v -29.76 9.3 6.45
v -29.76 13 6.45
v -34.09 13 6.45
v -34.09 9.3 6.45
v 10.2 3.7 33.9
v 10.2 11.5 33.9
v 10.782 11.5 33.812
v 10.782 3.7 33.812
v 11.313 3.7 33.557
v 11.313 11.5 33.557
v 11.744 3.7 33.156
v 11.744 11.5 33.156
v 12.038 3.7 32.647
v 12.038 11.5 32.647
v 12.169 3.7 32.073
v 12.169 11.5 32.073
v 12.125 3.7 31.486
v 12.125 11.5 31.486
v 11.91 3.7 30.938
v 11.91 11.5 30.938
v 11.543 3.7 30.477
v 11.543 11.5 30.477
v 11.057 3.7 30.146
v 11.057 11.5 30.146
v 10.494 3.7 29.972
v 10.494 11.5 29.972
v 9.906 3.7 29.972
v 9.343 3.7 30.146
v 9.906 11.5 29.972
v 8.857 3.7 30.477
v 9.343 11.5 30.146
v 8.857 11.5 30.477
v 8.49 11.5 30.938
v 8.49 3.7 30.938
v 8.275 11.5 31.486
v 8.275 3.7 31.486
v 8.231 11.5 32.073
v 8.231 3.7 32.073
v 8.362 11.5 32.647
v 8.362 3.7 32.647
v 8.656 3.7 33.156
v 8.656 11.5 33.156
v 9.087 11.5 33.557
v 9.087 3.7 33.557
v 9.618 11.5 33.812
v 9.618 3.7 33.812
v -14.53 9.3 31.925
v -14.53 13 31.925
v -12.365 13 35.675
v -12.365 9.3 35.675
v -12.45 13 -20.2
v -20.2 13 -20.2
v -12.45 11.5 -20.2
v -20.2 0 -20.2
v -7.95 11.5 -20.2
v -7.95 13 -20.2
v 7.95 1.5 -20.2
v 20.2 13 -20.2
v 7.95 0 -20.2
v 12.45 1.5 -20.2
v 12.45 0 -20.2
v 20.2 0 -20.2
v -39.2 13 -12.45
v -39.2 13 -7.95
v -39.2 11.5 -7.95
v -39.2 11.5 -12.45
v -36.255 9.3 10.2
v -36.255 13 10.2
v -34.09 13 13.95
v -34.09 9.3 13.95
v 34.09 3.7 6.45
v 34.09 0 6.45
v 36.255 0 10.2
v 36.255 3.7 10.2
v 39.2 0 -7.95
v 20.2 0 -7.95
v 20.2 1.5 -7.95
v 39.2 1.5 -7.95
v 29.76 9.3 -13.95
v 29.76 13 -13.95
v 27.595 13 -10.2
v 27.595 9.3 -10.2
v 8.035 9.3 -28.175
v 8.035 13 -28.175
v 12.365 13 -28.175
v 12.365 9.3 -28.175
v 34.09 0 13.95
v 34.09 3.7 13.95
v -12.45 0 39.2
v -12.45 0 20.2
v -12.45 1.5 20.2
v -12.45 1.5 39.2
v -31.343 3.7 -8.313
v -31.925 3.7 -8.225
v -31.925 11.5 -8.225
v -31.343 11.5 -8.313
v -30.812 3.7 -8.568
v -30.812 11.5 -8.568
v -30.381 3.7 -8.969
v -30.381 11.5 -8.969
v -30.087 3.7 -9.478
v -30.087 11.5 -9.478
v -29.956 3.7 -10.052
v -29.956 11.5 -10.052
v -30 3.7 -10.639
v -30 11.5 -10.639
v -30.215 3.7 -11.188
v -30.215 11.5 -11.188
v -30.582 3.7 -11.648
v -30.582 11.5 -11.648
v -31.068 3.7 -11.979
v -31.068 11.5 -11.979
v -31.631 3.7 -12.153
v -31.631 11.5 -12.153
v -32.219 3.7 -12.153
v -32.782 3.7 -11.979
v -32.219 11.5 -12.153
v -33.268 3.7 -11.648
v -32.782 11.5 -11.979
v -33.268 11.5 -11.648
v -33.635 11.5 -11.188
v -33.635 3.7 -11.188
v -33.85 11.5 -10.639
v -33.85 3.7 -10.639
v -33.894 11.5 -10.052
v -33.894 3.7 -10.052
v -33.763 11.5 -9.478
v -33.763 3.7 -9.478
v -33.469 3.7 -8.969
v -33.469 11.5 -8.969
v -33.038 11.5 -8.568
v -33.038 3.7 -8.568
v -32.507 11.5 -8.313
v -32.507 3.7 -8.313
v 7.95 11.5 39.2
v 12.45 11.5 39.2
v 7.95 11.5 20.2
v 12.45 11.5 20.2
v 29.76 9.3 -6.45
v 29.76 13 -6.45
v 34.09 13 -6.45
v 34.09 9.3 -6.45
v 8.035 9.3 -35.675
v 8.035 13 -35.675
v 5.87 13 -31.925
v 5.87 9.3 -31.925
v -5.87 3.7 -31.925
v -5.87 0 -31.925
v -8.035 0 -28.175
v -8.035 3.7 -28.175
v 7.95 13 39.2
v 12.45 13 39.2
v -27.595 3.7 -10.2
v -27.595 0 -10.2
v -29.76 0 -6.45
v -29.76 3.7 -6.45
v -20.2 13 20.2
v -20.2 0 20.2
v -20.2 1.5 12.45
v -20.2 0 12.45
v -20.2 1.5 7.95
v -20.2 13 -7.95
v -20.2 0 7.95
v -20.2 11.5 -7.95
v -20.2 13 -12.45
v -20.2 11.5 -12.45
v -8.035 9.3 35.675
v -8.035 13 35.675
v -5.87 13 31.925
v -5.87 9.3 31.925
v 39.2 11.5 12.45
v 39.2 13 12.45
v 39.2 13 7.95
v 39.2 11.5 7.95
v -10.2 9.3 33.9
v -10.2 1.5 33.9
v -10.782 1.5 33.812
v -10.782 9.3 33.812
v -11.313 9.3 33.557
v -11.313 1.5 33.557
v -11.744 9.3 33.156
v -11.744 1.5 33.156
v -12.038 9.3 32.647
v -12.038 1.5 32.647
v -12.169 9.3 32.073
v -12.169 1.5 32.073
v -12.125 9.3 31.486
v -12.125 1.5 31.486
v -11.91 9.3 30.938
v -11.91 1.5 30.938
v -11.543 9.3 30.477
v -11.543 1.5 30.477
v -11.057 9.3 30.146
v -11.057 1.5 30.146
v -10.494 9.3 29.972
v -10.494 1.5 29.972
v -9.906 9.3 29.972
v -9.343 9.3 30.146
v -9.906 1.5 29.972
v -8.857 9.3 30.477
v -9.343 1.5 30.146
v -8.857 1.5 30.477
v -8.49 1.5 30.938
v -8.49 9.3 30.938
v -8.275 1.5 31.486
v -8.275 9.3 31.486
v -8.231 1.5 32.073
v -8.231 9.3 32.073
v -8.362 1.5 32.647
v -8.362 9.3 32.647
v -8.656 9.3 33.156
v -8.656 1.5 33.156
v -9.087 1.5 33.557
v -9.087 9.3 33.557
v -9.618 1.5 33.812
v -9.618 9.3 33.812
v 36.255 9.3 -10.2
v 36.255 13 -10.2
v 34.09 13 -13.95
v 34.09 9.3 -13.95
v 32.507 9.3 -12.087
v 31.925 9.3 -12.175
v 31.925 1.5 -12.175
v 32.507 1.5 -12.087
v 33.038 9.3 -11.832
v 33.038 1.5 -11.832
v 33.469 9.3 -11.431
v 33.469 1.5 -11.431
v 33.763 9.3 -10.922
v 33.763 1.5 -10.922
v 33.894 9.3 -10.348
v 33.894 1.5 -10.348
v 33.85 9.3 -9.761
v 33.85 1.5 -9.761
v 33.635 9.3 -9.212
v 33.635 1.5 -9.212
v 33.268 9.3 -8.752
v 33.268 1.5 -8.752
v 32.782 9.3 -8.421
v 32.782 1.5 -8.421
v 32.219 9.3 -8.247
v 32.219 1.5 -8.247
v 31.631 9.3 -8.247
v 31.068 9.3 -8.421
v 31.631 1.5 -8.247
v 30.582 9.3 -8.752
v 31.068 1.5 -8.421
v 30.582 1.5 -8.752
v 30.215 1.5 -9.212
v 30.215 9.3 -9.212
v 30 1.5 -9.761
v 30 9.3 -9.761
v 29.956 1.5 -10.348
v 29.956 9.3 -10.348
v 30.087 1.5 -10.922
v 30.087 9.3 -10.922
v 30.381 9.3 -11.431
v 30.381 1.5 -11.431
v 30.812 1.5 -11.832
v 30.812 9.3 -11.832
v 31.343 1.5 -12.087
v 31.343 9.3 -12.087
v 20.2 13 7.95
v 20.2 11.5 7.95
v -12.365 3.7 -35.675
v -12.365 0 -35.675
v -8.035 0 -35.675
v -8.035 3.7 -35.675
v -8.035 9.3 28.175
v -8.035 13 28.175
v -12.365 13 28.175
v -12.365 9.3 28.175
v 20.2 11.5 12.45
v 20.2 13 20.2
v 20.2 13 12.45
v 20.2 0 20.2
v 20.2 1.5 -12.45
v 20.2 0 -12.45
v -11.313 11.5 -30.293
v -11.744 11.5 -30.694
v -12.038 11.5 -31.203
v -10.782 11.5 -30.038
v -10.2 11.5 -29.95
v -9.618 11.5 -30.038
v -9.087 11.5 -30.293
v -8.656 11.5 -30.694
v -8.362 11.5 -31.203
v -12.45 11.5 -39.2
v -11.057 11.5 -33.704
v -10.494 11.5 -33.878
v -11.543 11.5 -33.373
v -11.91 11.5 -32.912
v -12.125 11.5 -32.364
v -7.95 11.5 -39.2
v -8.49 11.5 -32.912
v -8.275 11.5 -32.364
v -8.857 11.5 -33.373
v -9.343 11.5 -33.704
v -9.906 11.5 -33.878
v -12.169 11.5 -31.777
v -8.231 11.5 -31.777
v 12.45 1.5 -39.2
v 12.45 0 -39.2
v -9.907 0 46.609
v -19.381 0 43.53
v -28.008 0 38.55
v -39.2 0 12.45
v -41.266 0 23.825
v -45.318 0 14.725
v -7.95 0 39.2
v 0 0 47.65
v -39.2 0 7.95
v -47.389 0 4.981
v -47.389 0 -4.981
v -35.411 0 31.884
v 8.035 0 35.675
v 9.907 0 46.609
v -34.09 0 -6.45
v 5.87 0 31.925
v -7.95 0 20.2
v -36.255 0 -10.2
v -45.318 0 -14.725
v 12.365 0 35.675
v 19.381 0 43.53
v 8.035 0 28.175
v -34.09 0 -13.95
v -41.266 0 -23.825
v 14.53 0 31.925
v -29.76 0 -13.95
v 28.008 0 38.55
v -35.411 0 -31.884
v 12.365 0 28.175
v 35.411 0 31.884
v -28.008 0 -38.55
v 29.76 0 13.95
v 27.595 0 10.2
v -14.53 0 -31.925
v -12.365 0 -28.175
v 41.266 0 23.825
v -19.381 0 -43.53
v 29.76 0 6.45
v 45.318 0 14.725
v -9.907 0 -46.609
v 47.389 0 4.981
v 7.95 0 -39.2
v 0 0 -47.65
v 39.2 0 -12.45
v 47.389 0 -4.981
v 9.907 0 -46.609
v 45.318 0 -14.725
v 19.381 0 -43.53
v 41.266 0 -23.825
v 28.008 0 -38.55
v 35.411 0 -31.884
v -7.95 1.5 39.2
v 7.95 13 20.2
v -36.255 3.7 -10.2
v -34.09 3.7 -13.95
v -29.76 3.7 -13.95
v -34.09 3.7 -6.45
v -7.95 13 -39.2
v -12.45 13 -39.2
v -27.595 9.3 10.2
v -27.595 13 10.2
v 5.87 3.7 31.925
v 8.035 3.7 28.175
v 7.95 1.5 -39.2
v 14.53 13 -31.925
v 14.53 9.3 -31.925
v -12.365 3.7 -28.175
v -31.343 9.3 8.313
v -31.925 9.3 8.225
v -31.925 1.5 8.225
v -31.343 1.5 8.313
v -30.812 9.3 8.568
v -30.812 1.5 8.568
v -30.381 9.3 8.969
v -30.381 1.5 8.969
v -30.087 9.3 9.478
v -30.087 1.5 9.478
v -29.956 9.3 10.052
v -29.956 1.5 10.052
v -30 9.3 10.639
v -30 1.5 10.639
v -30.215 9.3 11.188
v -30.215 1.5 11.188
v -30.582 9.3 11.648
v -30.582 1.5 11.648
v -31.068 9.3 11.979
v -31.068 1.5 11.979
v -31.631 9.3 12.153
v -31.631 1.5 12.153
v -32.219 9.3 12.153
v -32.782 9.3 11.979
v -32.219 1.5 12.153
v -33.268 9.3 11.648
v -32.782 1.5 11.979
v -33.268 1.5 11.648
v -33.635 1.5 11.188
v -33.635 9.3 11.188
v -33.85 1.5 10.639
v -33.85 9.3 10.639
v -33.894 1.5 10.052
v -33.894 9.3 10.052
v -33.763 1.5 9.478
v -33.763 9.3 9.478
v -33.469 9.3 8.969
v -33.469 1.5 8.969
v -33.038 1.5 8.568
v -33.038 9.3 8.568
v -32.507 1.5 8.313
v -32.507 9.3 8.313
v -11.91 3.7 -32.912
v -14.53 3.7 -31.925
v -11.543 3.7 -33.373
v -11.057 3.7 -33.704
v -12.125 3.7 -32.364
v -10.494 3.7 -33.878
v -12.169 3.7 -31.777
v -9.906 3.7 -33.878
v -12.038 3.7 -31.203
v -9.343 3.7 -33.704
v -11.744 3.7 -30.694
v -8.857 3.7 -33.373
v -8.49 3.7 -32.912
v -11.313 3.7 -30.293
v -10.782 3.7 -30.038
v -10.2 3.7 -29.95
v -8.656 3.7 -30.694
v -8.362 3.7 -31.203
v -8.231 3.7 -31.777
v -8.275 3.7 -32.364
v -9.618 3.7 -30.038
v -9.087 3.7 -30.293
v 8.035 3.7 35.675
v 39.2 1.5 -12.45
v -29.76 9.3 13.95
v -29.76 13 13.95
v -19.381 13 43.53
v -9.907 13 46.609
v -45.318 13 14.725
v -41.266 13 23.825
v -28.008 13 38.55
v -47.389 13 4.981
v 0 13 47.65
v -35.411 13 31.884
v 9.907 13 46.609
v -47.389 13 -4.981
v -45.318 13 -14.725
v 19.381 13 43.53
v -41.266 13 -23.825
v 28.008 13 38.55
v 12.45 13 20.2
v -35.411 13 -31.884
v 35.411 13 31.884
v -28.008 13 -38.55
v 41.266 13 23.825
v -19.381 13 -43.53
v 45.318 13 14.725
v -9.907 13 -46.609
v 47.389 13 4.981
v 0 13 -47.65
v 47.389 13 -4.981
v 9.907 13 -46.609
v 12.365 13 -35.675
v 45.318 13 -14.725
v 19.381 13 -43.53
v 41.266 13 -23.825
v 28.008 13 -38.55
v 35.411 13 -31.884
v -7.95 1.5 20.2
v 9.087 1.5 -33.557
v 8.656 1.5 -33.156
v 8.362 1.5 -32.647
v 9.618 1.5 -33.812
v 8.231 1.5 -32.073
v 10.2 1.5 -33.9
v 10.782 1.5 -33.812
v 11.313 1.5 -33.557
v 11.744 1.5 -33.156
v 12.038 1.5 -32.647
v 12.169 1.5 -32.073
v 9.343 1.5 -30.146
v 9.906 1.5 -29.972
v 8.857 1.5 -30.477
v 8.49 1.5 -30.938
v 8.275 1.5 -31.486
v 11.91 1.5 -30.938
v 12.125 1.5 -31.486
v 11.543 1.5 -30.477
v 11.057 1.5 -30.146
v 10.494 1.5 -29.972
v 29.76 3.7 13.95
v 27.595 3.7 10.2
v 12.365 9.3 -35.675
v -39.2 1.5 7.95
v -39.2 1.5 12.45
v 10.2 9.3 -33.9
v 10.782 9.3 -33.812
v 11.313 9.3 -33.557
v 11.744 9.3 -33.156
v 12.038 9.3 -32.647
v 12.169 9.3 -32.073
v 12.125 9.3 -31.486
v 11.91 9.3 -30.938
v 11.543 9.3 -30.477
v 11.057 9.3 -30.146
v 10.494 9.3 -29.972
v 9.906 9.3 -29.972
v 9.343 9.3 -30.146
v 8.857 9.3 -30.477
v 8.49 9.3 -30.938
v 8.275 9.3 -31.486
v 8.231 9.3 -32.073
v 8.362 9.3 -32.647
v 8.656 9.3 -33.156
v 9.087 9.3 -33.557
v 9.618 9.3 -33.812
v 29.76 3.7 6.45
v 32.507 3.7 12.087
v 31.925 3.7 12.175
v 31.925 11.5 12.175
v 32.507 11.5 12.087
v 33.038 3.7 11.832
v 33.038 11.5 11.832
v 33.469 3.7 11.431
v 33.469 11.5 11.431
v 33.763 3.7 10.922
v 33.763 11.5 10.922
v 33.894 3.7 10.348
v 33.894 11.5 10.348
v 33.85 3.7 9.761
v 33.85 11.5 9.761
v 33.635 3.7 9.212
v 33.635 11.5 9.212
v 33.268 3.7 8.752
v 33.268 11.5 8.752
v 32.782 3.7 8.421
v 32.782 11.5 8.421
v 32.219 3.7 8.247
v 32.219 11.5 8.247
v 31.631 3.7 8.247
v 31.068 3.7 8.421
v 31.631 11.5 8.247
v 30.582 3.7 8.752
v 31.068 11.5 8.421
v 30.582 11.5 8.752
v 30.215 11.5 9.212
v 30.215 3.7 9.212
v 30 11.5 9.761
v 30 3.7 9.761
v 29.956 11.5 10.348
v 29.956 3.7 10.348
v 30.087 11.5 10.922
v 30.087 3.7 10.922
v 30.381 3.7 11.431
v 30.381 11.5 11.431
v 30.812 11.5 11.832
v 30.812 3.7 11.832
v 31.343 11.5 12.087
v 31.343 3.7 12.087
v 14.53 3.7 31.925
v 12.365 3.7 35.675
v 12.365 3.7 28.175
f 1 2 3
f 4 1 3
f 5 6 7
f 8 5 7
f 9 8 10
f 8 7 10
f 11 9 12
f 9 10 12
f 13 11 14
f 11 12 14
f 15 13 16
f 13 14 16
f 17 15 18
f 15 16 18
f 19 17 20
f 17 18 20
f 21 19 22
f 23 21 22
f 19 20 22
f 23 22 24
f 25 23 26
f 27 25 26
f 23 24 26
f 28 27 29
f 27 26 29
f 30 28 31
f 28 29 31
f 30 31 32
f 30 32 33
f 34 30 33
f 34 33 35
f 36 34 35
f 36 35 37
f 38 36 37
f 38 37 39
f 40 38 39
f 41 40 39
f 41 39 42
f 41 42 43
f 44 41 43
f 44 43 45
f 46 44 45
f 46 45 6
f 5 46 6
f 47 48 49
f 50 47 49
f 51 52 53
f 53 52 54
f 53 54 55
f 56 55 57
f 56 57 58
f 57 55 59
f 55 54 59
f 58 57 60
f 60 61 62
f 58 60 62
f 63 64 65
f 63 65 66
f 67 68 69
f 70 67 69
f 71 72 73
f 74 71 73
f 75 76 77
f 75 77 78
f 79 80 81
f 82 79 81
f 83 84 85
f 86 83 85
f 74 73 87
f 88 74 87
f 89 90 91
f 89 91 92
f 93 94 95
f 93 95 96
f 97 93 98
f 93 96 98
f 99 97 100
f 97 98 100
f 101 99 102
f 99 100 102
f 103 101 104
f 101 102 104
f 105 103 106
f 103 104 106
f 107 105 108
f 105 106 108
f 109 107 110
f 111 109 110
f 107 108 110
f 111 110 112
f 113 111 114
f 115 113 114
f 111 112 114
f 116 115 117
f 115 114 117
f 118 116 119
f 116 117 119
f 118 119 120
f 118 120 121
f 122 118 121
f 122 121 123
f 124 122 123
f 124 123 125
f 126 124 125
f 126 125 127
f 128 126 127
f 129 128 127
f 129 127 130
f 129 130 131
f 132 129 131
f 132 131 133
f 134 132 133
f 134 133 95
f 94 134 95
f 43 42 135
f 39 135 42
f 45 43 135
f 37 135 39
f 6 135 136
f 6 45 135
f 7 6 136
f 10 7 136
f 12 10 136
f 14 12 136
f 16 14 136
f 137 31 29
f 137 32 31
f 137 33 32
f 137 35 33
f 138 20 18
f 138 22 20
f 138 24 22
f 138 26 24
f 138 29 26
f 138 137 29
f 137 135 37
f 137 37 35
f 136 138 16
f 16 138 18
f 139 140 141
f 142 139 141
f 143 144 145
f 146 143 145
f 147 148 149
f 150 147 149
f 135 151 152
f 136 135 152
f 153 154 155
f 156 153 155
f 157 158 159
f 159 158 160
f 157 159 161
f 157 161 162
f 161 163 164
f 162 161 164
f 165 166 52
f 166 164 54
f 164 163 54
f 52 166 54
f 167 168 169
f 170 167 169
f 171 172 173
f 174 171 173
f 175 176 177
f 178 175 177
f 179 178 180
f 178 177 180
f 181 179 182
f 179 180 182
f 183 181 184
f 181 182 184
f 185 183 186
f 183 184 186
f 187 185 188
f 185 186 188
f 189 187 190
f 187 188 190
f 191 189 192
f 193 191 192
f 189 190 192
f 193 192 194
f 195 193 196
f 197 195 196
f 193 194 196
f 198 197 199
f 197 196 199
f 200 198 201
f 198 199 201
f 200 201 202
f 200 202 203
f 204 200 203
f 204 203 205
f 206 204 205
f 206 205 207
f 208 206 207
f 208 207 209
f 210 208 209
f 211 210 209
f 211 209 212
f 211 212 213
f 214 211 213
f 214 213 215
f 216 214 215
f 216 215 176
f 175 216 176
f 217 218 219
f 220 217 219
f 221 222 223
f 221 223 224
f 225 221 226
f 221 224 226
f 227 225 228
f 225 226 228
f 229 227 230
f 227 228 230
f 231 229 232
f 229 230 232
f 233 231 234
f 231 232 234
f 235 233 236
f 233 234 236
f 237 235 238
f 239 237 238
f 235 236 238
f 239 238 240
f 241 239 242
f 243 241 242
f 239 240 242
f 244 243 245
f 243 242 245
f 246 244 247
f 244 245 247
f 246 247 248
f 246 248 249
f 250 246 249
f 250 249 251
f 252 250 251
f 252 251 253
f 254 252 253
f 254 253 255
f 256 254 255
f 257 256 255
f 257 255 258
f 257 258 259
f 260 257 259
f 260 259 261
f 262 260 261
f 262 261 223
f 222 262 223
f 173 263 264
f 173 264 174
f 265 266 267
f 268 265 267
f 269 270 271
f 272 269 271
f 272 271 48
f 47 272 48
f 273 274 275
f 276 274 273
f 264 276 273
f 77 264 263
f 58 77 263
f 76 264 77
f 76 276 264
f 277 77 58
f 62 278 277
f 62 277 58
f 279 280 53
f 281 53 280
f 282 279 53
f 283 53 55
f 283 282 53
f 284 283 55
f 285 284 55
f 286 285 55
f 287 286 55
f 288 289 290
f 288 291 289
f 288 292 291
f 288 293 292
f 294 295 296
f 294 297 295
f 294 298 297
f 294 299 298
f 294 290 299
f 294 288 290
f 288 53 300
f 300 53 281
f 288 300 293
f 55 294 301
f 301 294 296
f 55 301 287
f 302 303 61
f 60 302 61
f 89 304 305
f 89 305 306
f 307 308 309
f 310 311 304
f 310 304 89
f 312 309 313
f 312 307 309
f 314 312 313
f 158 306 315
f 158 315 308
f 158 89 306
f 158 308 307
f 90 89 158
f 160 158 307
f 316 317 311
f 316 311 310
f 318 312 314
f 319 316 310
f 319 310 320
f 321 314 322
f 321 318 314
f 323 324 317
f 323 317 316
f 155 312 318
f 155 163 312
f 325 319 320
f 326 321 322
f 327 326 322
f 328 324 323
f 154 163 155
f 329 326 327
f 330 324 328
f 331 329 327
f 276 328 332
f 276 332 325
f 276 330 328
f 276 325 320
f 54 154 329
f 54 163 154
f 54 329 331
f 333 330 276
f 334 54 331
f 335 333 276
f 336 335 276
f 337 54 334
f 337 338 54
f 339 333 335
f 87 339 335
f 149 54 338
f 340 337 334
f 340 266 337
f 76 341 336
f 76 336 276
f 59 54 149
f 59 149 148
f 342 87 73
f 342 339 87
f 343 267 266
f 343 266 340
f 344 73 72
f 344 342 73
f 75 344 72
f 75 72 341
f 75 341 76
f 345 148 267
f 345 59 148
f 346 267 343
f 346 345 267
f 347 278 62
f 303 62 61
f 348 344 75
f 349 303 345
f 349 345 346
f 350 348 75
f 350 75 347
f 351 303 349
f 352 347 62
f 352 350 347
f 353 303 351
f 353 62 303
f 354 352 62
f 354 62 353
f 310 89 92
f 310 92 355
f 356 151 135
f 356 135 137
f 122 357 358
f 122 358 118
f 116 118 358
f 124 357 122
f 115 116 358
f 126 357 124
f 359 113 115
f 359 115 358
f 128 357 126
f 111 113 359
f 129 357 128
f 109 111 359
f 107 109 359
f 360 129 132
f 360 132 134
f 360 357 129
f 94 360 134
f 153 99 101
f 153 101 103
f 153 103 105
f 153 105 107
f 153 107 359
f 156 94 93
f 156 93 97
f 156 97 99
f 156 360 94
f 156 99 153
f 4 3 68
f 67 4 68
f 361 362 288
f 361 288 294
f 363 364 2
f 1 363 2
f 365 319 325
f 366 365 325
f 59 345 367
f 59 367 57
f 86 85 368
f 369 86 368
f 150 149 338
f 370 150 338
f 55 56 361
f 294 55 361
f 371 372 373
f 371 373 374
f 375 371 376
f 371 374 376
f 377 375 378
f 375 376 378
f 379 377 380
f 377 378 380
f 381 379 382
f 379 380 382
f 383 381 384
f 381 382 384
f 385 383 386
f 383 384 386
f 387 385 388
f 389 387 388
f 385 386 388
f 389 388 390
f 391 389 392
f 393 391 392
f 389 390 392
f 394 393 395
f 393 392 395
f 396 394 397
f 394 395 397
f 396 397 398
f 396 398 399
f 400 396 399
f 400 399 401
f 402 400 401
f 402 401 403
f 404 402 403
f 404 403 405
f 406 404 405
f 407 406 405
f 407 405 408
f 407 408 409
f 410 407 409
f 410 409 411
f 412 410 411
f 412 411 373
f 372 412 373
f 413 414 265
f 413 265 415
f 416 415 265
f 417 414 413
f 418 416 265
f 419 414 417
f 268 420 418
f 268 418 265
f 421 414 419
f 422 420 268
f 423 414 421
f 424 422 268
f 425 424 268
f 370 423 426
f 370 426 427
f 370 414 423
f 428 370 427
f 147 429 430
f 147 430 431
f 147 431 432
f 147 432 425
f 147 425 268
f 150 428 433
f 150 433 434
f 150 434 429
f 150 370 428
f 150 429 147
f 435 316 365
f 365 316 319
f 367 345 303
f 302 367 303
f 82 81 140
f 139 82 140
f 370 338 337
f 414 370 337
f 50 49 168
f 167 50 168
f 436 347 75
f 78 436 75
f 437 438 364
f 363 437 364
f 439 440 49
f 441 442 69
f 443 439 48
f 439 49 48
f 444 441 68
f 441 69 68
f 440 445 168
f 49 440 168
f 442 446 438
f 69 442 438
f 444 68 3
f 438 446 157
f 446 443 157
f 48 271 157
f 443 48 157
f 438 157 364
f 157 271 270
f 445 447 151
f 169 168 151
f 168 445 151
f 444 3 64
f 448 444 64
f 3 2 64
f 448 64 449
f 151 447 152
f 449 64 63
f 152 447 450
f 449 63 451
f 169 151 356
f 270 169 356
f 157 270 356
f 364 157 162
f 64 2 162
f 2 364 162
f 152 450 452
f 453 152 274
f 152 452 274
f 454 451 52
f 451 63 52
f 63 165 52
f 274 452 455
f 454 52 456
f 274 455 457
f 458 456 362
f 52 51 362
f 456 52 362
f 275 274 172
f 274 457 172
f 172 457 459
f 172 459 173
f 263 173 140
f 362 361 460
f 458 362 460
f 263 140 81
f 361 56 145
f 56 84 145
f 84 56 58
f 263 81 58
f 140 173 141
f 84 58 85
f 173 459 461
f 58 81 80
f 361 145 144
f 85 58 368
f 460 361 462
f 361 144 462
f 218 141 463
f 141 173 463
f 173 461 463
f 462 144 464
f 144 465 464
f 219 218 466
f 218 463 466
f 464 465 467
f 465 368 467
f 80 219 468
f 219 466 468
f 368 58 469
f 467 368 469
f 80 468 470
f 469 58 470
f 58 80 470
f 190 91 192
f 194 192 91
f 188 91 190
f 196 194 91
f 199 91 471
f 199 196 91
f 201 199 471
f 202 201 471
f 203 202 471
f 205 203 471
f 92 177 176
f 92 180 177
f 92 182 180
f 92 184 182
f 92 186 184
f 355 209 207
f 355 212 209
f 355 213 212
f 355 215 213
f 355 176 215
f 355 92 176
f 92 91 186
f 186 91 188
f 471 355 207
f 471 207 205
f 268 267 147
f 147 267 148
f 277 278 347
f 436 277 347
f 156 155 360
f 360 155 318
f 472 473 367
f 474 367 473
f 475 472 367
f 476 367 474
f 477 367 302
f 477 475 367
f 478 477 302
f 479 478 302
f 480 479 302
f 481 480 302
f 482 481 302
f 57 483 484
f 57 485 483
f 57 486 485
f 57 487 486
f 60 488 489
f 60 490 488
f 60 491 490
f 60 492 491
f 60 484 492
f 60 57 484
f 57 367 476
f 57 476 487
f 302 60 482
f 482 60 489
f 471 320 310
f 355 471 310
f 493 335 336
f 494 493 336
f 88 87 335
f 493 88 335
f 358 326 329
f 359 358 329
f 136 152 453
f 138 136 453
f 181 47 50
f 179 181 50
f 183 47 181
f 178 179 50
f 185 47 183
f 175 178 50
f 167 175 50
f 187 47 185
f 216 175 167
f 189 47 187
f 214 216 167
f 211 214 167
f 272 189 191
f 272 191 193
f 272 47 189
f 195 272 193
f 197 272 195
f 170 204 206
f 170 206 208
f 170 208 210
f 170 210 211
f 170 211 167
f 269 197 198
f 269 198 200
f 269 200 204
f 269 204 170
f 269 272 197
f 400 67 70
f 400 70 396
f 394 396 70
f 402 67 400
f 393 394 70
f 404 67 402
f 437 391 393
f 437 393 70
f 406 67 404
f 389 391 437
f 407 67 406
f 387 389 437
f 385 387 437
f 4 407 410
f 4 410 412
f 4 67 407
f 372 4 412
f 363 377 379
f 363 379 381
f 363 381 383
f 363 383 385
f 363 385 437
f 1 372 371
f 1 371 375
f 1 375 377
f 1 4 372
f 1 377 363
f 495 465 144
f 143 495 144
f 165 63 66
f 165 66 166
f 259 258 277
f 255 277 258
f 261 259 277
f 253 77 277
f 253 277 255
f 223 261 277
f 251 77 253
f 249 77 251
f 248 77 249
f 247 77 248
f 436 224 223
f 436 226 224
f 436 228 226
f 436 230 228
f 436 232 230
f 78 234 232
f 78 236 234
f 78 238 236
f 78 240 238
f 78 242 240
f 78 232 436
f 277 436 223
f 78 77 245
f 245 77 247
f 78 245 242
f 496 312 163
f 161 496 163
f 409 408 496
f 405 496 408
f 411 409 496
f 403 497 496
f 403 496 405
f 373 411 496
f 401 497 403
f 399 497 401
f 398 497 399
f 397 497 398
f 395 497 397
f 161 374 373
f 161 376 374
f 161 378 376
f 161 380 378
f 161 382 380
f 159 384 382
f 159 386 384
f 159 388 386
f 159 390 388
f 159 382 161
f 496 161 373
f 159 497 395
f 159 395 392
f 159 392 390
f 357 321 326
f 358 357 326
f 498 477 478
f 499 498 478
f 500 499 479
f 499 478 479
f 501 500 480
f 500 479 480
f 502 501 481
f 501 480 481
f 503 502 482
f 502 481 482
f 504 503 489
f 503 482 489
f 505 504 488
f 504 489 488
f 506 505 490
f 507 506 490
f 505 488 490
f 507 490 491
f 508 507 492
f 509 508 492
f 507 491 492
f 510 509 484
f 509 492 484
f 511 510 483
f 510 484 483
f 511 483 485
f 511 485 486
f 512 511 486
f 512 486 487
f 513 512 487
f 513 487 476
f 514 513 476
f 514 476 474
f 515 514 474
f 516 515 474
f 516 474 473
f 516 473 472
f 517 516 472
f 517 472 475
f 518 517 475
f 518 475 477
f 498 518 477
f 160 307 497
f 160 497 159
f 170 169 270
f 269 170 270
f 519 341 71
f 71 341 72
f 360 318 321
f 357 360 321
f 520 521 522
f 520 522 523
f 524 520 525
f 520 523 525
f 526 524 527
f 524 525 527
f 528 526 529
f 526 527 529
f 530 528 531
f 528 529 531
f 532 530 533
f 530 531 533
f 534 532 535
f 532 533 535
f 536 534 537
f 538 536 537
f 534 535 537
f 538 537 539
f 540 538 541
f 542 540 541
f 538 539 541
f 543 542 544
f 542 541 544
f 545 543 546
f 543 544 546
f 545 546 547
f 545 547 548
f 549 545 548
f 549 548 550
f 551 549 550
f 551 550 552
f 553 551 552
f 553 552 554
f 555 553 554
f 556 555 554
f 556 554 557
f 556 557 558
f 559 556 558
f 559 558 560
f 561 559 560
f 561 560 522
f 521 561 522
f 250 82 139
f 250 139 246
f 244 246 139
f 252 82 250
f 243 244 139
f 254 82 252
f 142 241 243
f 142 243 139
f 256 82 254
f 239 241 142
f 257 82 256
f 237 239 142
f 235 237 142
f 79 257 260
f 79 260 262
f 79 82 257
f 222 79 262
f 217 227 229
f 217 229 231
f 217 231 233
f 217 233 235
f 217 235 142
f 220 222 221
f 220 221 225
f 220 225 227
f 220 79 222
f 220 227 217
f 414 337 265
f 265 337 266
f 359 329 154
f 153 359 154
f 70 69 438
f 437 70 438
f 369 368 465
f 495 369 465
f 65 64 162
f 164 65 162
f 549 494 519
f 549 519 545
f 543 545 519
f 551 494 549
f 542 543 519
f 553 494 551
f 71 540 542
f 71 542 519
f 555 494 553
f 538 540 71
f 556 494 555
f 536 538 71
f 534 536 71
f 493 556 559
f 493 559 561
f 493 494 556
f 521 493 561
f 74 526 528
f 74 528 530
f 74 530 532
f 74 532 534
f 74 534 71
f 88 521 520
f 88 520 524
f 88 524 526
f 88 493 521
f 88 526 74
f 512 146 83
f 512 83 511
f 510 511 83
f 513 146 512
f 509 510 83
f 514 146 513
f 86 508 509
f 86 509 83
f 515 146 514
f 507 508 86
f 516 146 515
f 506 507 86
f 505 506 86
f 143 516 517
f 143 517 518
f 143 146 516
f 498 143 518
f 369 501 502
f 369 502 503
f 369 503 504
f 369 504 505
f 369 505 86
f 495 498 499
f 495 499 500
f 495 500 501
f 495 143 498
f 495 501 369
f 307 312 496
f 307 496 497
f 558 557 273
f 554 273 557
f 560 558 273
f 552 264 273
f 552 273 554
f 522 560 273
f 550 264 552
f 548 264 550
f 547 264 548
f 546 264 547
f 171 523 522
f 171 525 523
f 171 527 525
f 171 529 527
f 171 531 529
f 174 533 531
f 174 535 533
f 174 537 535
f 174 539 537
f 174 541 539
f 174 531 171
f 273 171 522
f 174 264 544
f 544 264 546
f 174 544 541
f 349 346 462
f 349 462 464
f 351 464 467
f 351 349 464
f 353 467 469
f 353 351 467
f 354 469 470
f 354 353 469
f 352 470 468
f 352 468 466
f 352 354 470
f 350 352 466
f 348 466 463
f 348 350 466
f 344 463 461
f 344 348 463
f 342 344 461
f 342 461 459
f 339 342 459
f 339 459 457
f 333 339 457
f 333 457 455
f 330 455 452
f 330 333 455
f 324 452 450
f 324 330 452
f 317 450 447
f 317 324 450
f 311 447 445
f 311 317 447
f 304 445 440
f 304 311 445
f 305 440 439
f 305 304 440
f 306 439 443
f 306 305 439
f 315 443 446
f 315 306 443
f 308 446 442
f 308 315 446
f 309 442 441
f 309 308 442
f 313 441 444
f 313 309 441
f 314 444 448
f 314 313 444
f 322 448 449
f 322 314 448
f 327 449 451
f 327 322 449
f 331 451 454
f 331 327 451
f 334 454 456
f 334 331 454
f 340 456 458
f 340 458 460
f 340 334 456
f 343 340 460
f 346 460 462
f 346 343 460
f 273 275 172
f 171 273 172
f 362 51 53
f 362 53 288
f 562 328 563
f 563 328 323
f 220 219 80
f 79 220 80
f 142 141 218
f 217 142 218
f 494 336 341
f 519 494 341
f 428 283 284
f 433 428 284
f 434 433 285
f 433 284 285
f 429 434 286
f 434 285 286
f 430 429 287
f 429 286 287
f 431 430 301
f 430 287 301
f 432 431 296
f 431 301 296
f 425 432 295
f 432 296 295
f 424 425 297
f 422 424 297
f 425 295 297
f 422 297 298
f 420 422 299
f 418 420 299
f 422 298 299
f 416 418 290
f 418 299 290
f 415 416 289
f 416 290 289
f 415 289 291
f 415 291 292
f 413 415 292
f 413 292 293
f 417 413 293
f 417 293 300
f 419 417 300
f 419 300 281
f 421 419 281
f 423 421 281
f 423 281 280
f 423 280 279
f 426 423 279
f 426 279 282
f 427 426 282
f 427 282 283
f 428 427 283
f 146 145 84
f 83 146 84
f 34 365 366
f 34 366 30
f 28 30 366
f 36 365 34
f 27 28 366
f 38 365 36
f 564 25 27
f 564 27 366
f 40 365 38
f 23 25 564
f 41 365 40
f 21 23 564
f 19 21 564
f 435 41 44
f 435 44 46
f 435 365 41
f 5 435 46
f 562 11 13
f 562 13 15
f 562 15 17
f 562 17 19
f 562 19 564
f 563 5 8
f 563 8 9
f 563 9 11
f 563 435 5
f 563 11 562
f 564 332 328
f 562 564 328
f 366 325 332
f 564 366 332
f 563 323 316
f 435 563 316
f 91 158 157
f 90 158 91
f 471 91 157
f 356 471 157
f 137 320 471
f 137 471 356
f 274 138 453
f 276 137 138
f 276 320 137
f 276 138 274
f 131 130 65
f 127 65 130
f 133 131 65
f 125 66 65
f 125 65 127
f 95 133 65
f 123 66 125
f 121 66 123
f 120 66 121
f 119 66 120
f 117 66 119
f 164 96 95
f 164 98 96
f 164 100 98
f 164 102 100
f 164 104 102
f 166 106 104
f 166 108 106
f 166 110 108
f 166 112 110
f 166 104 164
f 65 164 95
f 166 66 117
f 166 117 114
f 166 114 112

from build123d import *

# Parameters (mm, degrees)
SKETCH1_R           = 50.1
SKETCH1_W           = 40.4
SKETCH1_H           = 40.4
BOSS_EXTRUDE1_DEPTH = 13
SKETCH4_W           = 4.5
SKETCH4_H           = 19
SKETCH4_W_2         = 19
SKETCH4_H_2         = 4.5
CUT_EXTRUDE1_DEPTH  = 1.5
SKETCH5_W           = 4.5
SKETCH5_H           = 19
SKETCH5_W_2         = 19
SKETCH5_H_2         = 4.5
CUT_EXTRUDE2_DEPTH  = 1.5
SKETCH6_R           = 1.975
CUT_EXTRUDE3_DEPTH  = 21.5
SKETCH8_R           = 1.975
CUT_EXTRUDE4_DEPTH  = 21.5
CUT_EXTRUDE5_DEPTH  = 3.7
CUT_EXTRUDE6_DEPTH  = 3.7
CUT_EXTRUDE7_START  = -24
SKETCH11_R          = 50.1
SKETCH11_R_2        = 47.6
CUT_EXTRUDE7_DEPTH  = 24
SKETCH12_R          = 47.65
SKETCH12_R_2        = 47.6
BOSS_EXTRUDE2_DEPTH = 13


with BuildPart() as part:
    # Sketch1 → Boss-Extrude1 (new body)
    with BuildSketch(Plane(origin=(0, 0, 0), x_dir=(1, 0, 0), z_dir=(0, 1, 0))):
        with Locations(Location((0, 0, 0), (0, 0, 90))):
            Circle(SKETCH1_R)
        Rectangle(SKETCH1_W, SKETCH1_H, mode=Mode.SUBTRACT)
    extrude(amount=BOSS_EXTRUDE1_DEPTH)

    # Sketch4 → Cut-Extrude1 (cut)
    with BuildSketch(Plane(origin=(0, 13, 0), x_dir=(1, 0, 0), z_dir=(0, 1, 0))):
        with Locations((-10.2, 29.7)):
            Rectangle(SKETCH4_W, SKETCH4_H)
        with Locations((29.7, -10.2)):
            Rectangle(SKETCH4_W_2, SKETCH4_H_2)
        with Locations((10.2, -29.7)):
            Rectangle(SKETCH4_W, SKETCH4_H)
        with Locations((-29.7, 10.2)):
            Rectangle(SKETCH4_W_2, SKETCH4_H_2)
    extrude(amount=-CUT_EXTRUDE1_DEPTH, mode=Mode.SUBTRACT)

    # Sketch5 → Cut-Extrude2 (cut)
    with BuildSketch(Plane.XZ):
        with Locations((-10.2, 29.7)):
            Rectangle(SKETCH5_W, SKETCH5_H)
        with Locations((29.7, -10.2)):
            Rectangle(SKETCH5_W_2, SKETCH5_H_2)
        with Locations((10.2, -29.7)):
            Rectangle(SKETCH5_W, SKETCH5_H)
        with Locations((-29.7, 10.2)):
            Rectangle(SKETCH5_W_2, SKETCH5_H_2)
    extrude(amount=-CUT_EXTRUDE2_DEPTH, mode=Mode.SUBTRACT)

    # Sketch6 → Cut-Extrude3 (cut)
    with BuildSketch(Plane(origin=(0, 13, 0), x_dir=(1, 0, 0), z_dir=(0, 1, 0))):
        with Locations(Location((31.925, -10.2, 0), (0, 0, 270))):
            Circle(SKETCH6_R)
        with Locations(Location((-10.2, 31.925, 0), (0, 0, 270))):
            Circle(SKETCH6_R)
        with Locations(Location((-31.925, 10.2, 0), (0, 0, 270))):
            Circle(SKETCH6_R)
        with Locations(Location((10.2, -31.925, 0), (0, 0, 270))):
            Circle(SKETCH6_R)
    extrude(amount=-CUT_EXTRUDE3_DEPTH, mode=Mode.SUBTRACT)

    # Sketch8 → Cut-Extrude4 (cut)
    with BuildSketch(Plane.XZ):
        with Locations(Location((-10.2, 31.925, 0), (0, 0, 90))):
            Circle(SKETCH8_R)
        with Locations(Location((31.925, -10.2, 0), (0, 0, 270))):
            Circle(SKETCH8_R)
        with Locations(Location((10.2, -31.925, 0), (0, 0, 270))):
            Circle(SKETCH8_R)
        with Locations(Location((-31.925, 10.2, 0), (0, 0, 270))):
            Circle(SKETCH8_R)
    extrude(amount=-CUT_EXTRUDE4_DEPTH, mode=Mode.SUBTRACT)

    # Sketch9 → Cut-Extrude5 (cut)
    with BuildSketch(Plane.XZ):
        Polygon((14.530127019, 31.925), (12.365063509, 35.675), (8.034936491, 35.675), (5.869872981, 31.925), (8.034936491, 28.175), (12.365063509, 28.175), align=None)
        Polygon((36.255127019, 10.2), (34.090063509, 13.95), (29.759936491, 13.95), (27.594872981, 10.2), (29.759936491, 6.45), (34.090063509, 6.45), align=None)
        Polygon((-27.594872981, -10.2), (-29.759936491, -6.45), (-34.090063509, -6.45), (-36.255127019, -10.2), (-34.090063509, -13.95), (-29.759936491, -13.95), align=None)
        Polygon((-5.869872981, -31.925), (-8.034936491, -28.175), (-12.365063509, -28.175), (-14.530127019, -31.925), (-12.365063509, -35.675), (-8.034936491, -35.675), align=None)
    extrude(amount=-CUT_EXTRUDE5_DEPTH, mode=Mode.SUBTRACT)

    # Sketch10 → Cut-Extrude6 (cut)
    with BuildSketch(Plane(origin=(0, 13, 0), x_dir=(1, 0, 0), z_dir=(0, 1, 0))):
        Polygon((14.530127019, 31.925), (12.365063509, 35.675), (8.034936491, 35.675), (5.869872981, 31.925), (8.034936491, 28.175), (12.365063509, 28.175), align=None)
        Polygon((36.255127019, 10.2), (34.090063509, 13.95), (29.759936491, 13.95), (27.594872981, 10.2), (29.759936491, 6.45), (34.090063509, 6.45), align=None)
        Polygon((-5.869872981, -31.925), (-8.034936491, -28.175), (-12.365063509, -28.175), (-14.530127019, -31.925), (-12.365063509, -35.675), (-8.034936491, -35.675), align=None)
        Polygon((-27.594872981, -10.2), (-29.759936491, -6.45), (-34.090063509, -6.45), (-36.255127019, -10.2), (-34.090063509, -13.95), (-29.759936491, -13.95), align=None)
    extrude(amount=-CUT_EXTRUDE6_DEPTH, mode=Mode.SUBTRACT)

    # Sketch11 → Cut-Extrude7 (cut)
    with BuildSketch(Plane(origin=(0, 13, 0), x_dir=(1, 0, 0), z_dir=(0, 1, 0)).offset(CUT_EXTRUDE7_START)):
        Circle(SKETCH11_R)
        with Locations(Location((0, 0, 0), (0, 0, 270))):
            Circle(SKETCH11_R_2, mode=Mode.SUBTRACT)
    extrude(amount=CUT_EXTRUDE7_DEPTH, mode=Mode.SUBTRACT)

    # Sketch12 → Boss-Extrude2 (add)
    with BuildSketch(Plane.XZ):
        with Locations(Location((0, 0, 0), (0, 0, 270))):
            Circle(SKETCH12_R)
        Circle(SKETCH12_R_2, mode=Mode.SUBTRACT)
    extrude(amount=-BOSS_EXTRUDE2_DEPTH)


solid = part.part
